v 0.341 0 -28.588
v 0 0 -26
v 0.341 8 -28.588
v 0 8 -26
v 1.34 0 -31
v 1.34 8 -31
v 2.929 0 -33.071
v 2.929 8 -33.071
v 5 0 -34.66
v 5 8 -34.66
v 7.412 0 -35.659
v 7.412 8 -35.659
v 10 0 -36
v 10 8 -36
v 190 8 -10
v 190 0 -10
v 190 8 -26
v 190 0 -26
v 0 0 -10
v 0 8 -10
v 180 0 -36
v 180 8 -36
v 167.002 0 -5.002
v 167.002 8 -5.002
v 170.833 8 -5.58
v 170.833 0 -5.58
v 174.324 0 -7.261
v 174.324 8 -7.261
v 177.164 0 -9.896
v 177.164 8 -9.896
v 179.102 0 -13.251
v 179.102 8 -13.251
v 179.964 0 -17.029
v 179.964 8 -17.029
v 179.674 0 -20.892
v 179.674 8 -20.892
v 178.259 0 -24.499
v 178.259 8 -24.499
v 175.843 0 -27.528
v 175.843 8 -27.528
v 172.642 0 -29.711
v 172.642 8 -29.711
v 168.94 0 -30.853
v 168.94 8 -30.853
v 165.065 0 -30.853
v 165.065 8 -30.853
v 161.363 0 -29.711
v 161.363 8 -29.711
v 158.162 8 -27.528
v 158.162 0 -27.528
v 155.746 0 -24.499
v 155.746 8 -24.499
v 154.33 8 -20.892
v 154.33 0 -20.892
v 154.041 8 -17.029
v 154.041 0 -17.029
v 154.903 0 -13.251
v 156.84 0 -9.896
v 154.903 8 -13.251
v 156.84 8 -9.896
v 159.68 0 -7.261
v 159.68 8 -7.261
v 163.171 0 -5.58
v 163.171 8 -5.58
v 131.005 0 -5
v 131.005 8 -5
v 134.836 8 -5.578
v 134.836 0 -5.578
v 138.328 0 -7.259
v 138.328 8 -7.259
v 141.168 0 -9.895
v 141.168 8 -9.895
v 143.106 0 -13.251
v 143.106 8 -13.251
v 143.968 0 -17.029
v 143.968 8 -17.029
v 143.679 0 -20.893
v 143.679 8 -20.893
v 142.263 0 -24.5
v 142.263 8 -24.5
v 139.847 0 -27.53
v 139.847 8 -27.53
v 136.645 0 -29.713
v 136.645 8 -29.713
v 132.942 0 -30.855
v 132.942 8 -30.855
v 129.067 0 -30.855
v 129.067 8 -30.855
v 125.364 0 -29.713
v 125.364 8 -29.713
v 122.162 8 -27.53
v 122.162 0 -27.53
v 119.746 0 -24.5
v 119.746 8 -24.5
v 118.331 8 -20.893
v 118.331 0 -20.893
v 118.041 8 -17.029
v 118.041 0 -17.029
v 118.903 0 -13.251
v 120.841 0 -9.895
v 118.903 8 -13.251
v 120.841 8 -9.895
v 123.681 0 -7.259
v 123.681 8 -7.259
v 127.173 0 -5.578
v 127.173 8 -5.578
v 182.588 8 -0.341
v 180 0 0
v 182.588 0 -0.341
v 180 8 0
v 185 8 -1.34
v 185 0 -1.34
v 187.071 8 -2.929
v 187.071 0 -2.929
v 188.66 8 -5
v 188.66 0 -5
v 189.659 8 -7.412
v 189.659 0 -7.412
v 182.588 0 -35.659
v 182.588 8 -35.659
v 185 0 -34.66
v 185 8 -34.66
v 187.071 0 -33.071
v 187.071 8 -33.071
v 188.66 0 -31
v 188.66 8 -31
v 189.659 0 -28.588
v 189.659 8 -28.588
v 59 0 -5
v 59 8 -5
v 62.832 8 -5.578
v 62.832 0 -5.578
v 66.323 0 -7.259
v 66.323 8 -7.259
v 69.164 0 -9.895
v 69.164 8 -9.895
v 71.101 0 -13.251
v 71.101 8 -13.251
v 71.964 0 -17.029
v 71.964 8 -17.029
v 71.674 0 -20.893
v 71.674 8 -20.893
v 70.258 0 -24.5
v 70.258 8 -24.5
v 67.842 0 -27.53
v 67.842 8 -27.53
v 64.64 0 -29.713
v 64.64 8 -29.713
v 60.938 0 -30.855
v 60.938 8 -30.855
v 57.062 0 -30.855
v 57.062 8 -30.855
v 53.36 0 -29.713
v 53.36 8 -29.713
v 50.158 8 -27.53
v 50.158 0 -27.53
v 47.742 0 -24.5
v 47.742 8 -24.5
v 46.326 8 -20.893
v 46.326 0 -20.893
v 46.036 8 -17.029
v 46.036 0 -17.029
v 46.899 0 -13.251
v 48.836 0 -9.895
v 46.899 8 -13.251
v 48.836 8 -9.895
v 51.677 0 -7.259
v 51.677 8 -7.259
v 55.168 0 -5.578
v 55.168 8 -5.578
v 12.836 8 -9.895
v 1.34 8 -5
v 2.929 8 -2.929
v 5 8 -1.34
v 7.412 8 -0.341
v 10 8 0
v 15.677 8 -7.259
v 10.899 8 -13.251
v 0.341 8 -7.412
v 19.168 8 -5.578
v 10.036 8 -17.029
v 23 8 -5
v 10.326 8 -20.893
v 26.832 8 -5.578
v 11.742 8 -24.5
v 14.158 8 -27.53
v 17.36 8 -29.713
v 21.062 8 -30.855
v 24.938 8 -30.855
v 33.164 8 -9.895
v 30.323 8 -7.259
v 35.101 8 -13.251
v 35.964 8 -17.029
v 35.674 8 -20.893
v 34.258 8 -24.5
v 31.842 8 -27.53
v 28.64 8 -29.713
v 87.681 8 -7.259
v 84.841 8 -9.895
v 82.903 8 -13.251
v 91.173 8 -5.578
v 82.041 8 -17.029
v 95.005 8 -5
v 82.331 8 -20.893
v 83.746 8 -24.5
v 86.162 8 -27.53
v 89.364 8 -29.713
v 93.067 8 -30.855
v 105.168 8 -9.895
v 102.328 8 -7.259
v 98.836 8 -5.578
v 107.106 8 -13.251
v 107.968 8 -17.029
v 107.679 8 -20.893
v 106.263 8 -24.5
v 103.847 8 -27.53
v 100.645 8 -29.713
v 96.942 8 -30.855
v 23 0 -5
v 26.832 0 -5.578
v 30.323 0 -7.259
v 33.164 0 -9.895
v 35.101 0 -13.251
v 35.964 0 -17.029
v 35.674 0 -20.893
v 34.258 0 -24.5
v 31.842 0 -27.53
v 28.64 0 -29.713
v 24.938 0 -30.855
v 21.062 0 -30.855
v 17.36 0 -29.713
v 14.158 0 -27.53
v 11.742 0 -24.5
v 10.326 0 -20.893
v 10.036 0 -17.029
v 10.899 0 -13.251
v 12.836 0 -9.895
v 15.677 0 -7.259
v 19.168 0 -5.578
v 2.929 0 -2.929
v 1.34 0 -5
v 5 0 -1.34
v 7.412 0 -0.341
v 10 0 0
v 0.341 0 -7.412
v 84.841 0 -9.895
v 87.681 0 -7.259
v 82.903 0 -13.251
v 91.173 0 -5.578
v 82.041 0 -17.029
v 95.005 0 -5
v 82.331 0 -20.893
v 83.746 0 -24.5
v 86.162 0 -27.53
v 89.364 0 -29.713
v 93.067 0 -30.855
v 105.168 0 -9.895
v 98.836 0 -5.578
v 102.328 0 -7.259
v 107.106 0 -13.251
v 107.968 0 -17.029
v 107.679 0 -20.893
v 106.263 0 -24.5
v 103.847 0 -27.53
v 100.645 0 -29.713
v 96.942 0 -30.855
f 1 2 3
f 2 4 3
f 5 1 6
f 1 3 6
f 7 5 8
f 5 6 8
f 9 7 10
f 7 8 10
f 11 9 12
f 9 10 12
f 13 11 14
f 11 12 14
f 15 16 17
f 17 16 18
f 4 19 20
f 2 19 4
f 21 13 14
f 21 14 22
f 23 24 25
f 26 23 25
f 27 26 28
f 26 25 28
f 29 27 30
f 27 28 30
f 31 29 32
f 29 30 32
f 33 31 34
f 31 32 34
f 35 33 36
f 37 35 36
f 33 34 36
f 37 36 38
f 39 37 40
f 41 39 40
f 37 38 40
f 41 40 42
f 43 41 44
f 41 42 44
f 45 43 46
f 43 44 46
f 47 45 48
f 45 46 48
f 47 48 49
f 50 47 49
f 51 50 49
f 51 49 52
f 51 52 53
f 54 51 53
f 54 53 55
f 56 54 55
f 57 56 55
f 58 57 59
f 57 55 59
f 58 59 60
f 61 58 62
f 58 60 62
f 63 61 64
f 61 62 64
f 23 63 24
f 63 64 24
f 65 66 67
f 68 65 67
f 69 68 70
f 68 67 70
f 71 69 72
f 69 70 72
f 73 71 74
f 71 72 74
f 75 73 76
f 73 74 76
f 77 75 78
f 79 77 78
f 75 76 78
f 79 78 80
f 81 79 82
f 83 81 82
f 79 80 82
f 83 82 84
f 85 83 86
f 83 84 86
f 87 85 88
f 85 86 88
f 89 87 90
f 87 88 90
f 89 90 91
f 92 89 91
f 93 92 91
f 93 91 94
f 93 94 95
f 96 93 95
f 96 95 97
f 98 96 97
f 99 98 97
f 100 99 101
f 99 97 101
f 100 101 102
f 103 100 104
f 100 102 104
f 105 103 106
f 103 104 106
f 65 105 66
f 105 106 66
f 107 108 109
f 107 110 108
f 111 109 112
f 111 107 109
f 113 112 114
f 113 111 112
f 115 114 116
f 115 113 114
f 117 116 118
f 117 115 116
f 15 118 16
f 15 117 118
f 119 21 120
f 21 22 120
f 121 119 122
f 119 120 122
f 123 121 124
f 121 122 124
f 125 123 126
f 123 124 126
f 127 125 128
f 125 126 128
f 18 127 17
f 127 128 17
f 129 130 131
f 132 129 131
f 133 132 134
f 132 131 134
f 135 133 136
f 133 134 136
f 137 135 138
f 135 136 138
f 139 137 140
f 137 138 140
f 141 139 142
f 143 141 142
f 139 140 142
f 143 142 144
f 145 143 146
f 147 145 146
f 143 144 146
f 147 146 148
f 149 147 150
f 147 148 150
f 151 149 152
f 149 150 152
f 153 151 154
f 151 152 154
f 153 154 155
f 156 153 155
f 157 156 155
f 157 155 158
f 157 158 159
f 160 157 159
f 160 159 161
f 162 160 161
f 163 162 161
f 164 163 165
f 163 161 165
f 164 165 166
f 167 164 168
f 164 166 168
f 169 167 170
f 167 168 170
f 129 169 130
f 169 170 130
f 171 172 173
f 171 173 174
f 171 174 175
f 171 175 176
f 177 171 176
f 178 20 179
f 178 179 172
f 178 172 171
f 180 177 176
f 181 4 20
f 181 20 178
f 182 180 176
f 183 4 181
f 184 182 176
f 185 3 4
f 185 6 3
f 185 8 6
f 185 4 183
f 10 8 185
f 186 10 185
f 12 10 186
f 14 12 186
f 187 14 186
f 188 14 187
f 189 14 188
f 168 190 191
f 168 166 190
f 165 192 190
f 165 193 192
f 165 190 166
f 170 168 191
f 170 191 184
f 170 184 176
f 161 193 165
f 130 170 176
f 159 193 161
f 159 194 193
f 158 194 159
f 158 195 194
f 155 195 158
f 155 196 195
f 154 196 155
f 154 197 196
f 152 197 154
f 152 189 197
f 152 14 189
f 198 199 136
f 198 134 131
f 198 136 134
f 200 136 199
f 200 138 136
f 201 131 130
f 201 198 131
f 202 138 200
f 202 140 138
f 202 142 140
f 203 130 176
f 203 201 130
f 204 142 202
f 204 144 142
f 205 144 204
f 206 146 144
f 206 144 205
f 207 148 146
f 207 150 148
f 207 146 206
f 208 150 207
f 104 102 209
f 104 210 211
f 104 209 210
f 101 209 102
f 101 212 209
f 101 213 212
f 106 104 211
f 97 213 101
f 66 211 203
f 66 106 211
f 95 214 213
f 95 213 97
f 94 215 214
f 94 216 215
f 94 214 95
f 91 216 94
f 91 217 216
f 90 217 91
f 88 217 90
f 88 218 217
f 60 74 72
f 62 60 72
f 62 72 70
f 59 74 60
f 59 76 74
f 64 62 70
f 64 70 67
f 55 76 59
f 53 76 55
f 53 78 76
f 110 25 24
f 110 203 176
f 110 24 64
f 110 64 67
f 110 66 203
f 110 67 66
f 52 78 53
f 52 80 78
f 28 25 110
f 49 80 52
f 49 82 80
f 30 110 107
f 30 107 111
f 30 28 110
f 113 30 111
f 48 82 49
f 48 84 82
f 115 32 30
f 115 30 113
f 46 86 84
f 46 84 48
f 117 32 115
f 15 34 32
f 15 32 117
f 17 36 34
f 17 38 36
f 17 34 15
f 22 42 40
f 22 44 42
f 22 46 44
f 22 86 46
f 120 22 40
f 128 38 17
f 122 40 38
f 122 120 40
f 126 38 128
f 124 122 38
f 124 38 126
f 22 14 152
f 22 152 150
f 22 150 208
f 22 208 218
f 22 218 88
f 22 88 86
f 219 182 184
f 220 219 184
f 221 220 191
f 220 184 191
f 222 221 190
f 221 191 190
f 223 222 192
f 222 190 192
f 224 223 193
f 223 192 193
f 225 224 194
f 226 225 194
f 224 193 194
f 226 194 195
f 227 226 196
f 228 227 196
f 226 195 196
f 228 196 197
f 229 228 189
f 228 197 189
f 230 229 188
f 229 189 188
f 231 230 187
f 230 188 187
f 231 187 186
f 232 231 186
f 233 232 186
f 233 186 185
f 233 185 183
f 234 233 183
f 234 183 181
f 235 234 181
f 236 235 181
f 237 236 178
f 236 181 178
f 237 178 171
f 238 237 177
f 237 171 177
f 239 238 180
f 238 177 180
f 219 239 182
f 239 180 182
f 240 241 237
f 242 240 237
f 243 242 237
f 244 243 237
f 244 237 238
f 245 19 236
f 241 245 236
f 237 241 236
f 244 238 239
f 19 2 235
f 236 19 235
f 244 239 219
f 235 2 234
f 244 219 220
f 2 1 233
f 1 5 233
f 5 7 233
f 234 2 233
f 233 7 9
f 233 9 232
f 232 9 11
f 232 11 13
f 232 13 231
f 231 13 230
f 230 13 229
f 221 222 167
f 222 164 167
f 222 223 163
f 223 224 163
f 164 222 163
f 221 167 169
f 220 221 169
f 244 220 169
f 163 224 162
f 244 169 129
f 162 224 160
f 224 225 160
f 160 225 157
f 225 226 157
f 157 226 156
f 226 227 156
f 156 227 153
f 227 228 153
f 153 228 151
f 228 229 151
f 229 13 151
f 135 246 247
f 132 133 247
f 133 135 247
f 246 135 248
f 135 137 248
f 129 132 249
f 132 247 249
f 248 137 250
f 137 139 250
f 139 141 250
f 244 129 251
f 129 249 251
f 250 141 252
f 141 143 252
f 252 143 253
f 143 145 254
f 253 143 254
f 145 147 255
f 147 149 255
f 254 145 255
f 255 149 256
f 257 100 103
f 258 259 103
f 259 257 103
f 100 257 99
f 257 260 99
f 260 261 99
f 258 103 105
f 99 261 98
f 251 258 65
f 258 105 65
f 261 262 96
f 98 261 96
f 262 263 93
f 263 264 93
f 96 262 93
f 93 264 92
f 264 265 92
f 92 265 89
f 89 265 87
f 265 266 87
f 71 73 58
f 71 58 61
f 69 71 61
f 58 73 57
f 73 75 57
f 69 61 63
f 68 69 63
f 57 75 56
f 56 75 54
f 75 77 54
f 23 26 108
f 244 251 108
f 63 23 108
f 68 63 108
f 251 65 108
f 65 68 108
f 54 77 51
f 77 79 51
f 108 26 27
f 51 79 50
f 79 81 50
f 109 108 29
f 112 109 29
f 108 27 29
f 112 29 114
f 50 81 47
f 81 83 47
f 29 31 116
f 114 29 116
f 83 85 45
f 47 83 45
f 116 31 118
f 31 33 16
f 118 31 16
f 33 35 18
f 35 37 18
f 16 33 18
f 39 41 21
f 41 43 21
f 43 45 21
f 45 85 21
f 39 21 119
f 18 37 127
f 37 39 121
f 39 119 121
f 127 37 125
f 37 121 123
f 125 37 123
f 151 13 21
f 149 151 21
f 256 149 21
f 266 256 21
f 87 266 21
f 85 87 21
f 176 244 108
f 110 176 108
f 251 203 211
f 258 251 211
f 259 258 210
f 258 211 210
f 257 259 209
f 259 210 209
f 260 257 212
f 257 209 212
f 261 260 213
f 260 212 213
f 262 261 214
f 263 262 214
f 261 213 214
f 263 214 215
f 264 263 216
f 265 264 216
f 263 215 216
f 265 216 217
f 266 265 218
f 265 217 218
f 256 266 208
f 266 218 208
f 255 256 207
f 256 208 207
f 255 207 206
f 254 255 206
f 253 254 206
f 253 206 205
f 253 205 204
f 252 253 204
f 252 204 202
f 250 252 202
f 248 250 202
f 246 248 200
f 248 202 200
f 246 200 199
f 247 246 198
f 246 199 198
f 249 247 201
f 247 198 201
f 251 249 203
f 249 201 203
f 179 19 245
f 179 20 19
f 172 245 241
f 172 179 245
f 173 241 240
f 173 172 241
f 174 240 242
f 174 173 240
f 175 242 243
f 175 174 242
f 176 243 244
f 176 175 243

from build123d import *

# Parameters (mm, degrees)
SKETCH5_W           = 190
SKETCH5_H           = 36
BOSS_EXTRUDE1_DEPTH = 8
SKETCH6_R           = 13
SKETCH6_R_2         = 12.99768992
CUT_EXTRUDE1_DEPTH  = 8
FILLET2_R           = 10


with BuildPart() as part:
    # Sketch5 → Boss-Extrude1 (new body)
    with BuildSketch(Plane(origin=(0, 0, 0), x_dir=(1, 0, 0), z_dir=(0, 1, 0))):
        with Locations((95, 18)):
            Rectangle(SKETCH5_W, SKETCH5_H)
    extrude(amount=BOSS_EXTRUDE1_DEPTH)

    # Sketch6 → Cut-Extrude1 (cut)
    with BuildSketch(Plane(origin=(0, 8, 0), x_dir=(1, 0, 0), z_dir=(0, 1, 0))):
        with Locations(Location((23, 18, 0), (0, 0, 270))):
            Circle(SKETCH6_R)
        with Locations(Location((59, 18, 0), (0, 0, 270))):
            Circle(SKETCH6_R)
        with Locations(Location((95.004620161, 18, 0), (0, 0, 270))):
            Circle(SKETCH6_R)
        with Locations(Location((131.004620161, 18, 0), (0, 0, 270))):
            Circle(SKETCH6_R)
        with Locations(Location((167.00231008, 18, 0), (0, 0, 270))):
            Circle(SKETCH6_R_2)
    extrude(amount=-CUT_EXTRUDE1_DEPTH, mode=Mode.SUBTRACT)

    # Fillet2
    fillet2_edges = [part.edges().sort_by_distance(p)[0] for p in [
        (0, 4, -36),
        (190, 4, -36),
        (190, 4, 0),
        (0, 4, 0),
    ]]
    fillet(fillet2_edges, radius=FILLET2_R)


solid = part.part
